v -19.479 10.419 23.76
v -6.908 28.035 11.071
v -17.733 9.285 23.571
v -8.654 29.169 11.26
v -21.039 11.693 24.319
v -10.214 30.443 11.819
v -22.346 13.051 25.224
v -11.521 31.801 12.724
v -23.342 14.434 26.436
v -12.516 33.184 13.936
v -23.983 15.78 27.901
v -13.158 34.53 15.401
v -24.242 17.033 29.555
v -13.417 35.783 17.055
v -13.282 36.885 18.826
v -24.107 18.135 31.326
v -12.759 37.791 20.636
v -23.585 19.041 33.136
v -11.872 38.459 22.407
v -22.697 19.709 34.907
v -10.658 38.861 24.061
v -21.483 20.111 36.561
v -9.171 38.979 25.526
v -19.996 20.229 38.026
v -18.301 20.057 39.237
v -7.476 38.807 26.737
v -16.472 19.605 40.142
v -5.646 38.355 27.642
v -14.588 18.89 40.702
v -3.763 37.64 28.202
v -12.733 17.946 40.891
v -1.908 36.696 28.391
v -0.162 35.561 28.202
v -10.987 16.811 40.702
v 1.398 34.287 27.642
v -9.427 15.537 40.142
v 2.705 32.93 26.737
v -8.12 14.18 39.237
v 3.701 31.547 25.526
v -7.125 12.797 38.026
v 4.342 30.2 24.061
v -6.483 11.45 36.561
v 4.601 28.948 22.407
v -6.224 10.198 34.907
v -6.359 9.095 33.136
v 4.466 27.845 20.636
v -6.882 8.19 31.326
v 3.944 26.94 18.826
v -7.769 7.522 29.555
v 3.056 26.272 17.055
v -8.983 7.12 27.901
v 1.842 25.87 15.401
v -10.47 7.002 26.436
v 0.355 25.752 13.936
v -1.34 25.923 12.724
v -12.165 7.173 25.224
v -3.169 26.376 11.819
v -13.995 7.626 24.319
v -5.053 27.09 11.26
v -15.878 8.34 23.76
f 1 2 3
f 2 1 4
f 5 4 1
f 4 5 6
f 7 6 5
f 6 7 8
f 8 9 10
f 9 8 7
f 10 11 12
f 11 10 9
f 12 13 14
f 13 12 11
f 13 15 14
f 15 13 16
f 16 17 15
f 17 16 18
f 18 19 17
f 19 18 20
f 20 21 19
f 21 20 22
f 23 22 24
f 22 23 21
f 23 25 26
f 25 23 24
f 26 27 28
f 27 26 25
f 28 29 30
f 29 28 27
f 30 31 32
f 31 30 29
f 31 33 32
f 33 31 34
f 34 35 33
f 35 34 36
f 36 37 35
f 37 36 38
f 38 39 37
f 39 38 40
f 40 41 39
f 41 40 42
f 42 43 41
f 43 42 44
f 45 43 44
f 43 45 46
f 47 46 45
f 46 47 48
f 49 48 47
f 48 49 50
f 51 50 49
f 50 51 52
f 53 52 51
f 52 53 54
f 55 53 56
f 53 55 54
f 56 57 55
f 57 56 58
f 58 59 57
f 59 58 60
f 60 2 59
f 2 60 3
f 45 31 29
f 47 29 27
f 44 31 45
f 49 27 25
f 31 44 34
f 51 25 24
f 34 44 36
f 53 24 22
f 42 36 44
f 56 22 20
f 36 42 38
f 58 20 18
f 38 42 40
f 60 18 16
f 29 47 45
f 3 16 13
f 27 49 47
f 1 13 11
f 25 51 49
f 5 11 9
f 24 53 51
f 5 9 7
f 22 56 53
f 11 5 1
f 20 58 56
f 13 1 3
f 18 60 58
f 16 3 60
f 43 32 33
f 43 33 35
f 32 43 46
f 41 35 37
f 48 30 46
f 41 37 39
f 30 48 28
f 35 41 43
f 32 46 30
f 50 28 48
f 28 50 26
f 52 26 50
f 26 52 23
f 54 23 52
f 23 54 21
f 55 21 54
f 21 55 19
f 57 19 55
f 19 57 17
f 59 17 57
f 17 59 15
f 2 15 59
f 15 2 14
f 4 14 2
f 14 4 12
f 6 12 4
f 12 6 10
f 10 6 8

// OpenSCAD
// Generated by generate_scads.py
rotate([0,120,60]) {
  translate([-30,20,0]) {
    cylinder(h=25, r=10, center=true);
  }
}
